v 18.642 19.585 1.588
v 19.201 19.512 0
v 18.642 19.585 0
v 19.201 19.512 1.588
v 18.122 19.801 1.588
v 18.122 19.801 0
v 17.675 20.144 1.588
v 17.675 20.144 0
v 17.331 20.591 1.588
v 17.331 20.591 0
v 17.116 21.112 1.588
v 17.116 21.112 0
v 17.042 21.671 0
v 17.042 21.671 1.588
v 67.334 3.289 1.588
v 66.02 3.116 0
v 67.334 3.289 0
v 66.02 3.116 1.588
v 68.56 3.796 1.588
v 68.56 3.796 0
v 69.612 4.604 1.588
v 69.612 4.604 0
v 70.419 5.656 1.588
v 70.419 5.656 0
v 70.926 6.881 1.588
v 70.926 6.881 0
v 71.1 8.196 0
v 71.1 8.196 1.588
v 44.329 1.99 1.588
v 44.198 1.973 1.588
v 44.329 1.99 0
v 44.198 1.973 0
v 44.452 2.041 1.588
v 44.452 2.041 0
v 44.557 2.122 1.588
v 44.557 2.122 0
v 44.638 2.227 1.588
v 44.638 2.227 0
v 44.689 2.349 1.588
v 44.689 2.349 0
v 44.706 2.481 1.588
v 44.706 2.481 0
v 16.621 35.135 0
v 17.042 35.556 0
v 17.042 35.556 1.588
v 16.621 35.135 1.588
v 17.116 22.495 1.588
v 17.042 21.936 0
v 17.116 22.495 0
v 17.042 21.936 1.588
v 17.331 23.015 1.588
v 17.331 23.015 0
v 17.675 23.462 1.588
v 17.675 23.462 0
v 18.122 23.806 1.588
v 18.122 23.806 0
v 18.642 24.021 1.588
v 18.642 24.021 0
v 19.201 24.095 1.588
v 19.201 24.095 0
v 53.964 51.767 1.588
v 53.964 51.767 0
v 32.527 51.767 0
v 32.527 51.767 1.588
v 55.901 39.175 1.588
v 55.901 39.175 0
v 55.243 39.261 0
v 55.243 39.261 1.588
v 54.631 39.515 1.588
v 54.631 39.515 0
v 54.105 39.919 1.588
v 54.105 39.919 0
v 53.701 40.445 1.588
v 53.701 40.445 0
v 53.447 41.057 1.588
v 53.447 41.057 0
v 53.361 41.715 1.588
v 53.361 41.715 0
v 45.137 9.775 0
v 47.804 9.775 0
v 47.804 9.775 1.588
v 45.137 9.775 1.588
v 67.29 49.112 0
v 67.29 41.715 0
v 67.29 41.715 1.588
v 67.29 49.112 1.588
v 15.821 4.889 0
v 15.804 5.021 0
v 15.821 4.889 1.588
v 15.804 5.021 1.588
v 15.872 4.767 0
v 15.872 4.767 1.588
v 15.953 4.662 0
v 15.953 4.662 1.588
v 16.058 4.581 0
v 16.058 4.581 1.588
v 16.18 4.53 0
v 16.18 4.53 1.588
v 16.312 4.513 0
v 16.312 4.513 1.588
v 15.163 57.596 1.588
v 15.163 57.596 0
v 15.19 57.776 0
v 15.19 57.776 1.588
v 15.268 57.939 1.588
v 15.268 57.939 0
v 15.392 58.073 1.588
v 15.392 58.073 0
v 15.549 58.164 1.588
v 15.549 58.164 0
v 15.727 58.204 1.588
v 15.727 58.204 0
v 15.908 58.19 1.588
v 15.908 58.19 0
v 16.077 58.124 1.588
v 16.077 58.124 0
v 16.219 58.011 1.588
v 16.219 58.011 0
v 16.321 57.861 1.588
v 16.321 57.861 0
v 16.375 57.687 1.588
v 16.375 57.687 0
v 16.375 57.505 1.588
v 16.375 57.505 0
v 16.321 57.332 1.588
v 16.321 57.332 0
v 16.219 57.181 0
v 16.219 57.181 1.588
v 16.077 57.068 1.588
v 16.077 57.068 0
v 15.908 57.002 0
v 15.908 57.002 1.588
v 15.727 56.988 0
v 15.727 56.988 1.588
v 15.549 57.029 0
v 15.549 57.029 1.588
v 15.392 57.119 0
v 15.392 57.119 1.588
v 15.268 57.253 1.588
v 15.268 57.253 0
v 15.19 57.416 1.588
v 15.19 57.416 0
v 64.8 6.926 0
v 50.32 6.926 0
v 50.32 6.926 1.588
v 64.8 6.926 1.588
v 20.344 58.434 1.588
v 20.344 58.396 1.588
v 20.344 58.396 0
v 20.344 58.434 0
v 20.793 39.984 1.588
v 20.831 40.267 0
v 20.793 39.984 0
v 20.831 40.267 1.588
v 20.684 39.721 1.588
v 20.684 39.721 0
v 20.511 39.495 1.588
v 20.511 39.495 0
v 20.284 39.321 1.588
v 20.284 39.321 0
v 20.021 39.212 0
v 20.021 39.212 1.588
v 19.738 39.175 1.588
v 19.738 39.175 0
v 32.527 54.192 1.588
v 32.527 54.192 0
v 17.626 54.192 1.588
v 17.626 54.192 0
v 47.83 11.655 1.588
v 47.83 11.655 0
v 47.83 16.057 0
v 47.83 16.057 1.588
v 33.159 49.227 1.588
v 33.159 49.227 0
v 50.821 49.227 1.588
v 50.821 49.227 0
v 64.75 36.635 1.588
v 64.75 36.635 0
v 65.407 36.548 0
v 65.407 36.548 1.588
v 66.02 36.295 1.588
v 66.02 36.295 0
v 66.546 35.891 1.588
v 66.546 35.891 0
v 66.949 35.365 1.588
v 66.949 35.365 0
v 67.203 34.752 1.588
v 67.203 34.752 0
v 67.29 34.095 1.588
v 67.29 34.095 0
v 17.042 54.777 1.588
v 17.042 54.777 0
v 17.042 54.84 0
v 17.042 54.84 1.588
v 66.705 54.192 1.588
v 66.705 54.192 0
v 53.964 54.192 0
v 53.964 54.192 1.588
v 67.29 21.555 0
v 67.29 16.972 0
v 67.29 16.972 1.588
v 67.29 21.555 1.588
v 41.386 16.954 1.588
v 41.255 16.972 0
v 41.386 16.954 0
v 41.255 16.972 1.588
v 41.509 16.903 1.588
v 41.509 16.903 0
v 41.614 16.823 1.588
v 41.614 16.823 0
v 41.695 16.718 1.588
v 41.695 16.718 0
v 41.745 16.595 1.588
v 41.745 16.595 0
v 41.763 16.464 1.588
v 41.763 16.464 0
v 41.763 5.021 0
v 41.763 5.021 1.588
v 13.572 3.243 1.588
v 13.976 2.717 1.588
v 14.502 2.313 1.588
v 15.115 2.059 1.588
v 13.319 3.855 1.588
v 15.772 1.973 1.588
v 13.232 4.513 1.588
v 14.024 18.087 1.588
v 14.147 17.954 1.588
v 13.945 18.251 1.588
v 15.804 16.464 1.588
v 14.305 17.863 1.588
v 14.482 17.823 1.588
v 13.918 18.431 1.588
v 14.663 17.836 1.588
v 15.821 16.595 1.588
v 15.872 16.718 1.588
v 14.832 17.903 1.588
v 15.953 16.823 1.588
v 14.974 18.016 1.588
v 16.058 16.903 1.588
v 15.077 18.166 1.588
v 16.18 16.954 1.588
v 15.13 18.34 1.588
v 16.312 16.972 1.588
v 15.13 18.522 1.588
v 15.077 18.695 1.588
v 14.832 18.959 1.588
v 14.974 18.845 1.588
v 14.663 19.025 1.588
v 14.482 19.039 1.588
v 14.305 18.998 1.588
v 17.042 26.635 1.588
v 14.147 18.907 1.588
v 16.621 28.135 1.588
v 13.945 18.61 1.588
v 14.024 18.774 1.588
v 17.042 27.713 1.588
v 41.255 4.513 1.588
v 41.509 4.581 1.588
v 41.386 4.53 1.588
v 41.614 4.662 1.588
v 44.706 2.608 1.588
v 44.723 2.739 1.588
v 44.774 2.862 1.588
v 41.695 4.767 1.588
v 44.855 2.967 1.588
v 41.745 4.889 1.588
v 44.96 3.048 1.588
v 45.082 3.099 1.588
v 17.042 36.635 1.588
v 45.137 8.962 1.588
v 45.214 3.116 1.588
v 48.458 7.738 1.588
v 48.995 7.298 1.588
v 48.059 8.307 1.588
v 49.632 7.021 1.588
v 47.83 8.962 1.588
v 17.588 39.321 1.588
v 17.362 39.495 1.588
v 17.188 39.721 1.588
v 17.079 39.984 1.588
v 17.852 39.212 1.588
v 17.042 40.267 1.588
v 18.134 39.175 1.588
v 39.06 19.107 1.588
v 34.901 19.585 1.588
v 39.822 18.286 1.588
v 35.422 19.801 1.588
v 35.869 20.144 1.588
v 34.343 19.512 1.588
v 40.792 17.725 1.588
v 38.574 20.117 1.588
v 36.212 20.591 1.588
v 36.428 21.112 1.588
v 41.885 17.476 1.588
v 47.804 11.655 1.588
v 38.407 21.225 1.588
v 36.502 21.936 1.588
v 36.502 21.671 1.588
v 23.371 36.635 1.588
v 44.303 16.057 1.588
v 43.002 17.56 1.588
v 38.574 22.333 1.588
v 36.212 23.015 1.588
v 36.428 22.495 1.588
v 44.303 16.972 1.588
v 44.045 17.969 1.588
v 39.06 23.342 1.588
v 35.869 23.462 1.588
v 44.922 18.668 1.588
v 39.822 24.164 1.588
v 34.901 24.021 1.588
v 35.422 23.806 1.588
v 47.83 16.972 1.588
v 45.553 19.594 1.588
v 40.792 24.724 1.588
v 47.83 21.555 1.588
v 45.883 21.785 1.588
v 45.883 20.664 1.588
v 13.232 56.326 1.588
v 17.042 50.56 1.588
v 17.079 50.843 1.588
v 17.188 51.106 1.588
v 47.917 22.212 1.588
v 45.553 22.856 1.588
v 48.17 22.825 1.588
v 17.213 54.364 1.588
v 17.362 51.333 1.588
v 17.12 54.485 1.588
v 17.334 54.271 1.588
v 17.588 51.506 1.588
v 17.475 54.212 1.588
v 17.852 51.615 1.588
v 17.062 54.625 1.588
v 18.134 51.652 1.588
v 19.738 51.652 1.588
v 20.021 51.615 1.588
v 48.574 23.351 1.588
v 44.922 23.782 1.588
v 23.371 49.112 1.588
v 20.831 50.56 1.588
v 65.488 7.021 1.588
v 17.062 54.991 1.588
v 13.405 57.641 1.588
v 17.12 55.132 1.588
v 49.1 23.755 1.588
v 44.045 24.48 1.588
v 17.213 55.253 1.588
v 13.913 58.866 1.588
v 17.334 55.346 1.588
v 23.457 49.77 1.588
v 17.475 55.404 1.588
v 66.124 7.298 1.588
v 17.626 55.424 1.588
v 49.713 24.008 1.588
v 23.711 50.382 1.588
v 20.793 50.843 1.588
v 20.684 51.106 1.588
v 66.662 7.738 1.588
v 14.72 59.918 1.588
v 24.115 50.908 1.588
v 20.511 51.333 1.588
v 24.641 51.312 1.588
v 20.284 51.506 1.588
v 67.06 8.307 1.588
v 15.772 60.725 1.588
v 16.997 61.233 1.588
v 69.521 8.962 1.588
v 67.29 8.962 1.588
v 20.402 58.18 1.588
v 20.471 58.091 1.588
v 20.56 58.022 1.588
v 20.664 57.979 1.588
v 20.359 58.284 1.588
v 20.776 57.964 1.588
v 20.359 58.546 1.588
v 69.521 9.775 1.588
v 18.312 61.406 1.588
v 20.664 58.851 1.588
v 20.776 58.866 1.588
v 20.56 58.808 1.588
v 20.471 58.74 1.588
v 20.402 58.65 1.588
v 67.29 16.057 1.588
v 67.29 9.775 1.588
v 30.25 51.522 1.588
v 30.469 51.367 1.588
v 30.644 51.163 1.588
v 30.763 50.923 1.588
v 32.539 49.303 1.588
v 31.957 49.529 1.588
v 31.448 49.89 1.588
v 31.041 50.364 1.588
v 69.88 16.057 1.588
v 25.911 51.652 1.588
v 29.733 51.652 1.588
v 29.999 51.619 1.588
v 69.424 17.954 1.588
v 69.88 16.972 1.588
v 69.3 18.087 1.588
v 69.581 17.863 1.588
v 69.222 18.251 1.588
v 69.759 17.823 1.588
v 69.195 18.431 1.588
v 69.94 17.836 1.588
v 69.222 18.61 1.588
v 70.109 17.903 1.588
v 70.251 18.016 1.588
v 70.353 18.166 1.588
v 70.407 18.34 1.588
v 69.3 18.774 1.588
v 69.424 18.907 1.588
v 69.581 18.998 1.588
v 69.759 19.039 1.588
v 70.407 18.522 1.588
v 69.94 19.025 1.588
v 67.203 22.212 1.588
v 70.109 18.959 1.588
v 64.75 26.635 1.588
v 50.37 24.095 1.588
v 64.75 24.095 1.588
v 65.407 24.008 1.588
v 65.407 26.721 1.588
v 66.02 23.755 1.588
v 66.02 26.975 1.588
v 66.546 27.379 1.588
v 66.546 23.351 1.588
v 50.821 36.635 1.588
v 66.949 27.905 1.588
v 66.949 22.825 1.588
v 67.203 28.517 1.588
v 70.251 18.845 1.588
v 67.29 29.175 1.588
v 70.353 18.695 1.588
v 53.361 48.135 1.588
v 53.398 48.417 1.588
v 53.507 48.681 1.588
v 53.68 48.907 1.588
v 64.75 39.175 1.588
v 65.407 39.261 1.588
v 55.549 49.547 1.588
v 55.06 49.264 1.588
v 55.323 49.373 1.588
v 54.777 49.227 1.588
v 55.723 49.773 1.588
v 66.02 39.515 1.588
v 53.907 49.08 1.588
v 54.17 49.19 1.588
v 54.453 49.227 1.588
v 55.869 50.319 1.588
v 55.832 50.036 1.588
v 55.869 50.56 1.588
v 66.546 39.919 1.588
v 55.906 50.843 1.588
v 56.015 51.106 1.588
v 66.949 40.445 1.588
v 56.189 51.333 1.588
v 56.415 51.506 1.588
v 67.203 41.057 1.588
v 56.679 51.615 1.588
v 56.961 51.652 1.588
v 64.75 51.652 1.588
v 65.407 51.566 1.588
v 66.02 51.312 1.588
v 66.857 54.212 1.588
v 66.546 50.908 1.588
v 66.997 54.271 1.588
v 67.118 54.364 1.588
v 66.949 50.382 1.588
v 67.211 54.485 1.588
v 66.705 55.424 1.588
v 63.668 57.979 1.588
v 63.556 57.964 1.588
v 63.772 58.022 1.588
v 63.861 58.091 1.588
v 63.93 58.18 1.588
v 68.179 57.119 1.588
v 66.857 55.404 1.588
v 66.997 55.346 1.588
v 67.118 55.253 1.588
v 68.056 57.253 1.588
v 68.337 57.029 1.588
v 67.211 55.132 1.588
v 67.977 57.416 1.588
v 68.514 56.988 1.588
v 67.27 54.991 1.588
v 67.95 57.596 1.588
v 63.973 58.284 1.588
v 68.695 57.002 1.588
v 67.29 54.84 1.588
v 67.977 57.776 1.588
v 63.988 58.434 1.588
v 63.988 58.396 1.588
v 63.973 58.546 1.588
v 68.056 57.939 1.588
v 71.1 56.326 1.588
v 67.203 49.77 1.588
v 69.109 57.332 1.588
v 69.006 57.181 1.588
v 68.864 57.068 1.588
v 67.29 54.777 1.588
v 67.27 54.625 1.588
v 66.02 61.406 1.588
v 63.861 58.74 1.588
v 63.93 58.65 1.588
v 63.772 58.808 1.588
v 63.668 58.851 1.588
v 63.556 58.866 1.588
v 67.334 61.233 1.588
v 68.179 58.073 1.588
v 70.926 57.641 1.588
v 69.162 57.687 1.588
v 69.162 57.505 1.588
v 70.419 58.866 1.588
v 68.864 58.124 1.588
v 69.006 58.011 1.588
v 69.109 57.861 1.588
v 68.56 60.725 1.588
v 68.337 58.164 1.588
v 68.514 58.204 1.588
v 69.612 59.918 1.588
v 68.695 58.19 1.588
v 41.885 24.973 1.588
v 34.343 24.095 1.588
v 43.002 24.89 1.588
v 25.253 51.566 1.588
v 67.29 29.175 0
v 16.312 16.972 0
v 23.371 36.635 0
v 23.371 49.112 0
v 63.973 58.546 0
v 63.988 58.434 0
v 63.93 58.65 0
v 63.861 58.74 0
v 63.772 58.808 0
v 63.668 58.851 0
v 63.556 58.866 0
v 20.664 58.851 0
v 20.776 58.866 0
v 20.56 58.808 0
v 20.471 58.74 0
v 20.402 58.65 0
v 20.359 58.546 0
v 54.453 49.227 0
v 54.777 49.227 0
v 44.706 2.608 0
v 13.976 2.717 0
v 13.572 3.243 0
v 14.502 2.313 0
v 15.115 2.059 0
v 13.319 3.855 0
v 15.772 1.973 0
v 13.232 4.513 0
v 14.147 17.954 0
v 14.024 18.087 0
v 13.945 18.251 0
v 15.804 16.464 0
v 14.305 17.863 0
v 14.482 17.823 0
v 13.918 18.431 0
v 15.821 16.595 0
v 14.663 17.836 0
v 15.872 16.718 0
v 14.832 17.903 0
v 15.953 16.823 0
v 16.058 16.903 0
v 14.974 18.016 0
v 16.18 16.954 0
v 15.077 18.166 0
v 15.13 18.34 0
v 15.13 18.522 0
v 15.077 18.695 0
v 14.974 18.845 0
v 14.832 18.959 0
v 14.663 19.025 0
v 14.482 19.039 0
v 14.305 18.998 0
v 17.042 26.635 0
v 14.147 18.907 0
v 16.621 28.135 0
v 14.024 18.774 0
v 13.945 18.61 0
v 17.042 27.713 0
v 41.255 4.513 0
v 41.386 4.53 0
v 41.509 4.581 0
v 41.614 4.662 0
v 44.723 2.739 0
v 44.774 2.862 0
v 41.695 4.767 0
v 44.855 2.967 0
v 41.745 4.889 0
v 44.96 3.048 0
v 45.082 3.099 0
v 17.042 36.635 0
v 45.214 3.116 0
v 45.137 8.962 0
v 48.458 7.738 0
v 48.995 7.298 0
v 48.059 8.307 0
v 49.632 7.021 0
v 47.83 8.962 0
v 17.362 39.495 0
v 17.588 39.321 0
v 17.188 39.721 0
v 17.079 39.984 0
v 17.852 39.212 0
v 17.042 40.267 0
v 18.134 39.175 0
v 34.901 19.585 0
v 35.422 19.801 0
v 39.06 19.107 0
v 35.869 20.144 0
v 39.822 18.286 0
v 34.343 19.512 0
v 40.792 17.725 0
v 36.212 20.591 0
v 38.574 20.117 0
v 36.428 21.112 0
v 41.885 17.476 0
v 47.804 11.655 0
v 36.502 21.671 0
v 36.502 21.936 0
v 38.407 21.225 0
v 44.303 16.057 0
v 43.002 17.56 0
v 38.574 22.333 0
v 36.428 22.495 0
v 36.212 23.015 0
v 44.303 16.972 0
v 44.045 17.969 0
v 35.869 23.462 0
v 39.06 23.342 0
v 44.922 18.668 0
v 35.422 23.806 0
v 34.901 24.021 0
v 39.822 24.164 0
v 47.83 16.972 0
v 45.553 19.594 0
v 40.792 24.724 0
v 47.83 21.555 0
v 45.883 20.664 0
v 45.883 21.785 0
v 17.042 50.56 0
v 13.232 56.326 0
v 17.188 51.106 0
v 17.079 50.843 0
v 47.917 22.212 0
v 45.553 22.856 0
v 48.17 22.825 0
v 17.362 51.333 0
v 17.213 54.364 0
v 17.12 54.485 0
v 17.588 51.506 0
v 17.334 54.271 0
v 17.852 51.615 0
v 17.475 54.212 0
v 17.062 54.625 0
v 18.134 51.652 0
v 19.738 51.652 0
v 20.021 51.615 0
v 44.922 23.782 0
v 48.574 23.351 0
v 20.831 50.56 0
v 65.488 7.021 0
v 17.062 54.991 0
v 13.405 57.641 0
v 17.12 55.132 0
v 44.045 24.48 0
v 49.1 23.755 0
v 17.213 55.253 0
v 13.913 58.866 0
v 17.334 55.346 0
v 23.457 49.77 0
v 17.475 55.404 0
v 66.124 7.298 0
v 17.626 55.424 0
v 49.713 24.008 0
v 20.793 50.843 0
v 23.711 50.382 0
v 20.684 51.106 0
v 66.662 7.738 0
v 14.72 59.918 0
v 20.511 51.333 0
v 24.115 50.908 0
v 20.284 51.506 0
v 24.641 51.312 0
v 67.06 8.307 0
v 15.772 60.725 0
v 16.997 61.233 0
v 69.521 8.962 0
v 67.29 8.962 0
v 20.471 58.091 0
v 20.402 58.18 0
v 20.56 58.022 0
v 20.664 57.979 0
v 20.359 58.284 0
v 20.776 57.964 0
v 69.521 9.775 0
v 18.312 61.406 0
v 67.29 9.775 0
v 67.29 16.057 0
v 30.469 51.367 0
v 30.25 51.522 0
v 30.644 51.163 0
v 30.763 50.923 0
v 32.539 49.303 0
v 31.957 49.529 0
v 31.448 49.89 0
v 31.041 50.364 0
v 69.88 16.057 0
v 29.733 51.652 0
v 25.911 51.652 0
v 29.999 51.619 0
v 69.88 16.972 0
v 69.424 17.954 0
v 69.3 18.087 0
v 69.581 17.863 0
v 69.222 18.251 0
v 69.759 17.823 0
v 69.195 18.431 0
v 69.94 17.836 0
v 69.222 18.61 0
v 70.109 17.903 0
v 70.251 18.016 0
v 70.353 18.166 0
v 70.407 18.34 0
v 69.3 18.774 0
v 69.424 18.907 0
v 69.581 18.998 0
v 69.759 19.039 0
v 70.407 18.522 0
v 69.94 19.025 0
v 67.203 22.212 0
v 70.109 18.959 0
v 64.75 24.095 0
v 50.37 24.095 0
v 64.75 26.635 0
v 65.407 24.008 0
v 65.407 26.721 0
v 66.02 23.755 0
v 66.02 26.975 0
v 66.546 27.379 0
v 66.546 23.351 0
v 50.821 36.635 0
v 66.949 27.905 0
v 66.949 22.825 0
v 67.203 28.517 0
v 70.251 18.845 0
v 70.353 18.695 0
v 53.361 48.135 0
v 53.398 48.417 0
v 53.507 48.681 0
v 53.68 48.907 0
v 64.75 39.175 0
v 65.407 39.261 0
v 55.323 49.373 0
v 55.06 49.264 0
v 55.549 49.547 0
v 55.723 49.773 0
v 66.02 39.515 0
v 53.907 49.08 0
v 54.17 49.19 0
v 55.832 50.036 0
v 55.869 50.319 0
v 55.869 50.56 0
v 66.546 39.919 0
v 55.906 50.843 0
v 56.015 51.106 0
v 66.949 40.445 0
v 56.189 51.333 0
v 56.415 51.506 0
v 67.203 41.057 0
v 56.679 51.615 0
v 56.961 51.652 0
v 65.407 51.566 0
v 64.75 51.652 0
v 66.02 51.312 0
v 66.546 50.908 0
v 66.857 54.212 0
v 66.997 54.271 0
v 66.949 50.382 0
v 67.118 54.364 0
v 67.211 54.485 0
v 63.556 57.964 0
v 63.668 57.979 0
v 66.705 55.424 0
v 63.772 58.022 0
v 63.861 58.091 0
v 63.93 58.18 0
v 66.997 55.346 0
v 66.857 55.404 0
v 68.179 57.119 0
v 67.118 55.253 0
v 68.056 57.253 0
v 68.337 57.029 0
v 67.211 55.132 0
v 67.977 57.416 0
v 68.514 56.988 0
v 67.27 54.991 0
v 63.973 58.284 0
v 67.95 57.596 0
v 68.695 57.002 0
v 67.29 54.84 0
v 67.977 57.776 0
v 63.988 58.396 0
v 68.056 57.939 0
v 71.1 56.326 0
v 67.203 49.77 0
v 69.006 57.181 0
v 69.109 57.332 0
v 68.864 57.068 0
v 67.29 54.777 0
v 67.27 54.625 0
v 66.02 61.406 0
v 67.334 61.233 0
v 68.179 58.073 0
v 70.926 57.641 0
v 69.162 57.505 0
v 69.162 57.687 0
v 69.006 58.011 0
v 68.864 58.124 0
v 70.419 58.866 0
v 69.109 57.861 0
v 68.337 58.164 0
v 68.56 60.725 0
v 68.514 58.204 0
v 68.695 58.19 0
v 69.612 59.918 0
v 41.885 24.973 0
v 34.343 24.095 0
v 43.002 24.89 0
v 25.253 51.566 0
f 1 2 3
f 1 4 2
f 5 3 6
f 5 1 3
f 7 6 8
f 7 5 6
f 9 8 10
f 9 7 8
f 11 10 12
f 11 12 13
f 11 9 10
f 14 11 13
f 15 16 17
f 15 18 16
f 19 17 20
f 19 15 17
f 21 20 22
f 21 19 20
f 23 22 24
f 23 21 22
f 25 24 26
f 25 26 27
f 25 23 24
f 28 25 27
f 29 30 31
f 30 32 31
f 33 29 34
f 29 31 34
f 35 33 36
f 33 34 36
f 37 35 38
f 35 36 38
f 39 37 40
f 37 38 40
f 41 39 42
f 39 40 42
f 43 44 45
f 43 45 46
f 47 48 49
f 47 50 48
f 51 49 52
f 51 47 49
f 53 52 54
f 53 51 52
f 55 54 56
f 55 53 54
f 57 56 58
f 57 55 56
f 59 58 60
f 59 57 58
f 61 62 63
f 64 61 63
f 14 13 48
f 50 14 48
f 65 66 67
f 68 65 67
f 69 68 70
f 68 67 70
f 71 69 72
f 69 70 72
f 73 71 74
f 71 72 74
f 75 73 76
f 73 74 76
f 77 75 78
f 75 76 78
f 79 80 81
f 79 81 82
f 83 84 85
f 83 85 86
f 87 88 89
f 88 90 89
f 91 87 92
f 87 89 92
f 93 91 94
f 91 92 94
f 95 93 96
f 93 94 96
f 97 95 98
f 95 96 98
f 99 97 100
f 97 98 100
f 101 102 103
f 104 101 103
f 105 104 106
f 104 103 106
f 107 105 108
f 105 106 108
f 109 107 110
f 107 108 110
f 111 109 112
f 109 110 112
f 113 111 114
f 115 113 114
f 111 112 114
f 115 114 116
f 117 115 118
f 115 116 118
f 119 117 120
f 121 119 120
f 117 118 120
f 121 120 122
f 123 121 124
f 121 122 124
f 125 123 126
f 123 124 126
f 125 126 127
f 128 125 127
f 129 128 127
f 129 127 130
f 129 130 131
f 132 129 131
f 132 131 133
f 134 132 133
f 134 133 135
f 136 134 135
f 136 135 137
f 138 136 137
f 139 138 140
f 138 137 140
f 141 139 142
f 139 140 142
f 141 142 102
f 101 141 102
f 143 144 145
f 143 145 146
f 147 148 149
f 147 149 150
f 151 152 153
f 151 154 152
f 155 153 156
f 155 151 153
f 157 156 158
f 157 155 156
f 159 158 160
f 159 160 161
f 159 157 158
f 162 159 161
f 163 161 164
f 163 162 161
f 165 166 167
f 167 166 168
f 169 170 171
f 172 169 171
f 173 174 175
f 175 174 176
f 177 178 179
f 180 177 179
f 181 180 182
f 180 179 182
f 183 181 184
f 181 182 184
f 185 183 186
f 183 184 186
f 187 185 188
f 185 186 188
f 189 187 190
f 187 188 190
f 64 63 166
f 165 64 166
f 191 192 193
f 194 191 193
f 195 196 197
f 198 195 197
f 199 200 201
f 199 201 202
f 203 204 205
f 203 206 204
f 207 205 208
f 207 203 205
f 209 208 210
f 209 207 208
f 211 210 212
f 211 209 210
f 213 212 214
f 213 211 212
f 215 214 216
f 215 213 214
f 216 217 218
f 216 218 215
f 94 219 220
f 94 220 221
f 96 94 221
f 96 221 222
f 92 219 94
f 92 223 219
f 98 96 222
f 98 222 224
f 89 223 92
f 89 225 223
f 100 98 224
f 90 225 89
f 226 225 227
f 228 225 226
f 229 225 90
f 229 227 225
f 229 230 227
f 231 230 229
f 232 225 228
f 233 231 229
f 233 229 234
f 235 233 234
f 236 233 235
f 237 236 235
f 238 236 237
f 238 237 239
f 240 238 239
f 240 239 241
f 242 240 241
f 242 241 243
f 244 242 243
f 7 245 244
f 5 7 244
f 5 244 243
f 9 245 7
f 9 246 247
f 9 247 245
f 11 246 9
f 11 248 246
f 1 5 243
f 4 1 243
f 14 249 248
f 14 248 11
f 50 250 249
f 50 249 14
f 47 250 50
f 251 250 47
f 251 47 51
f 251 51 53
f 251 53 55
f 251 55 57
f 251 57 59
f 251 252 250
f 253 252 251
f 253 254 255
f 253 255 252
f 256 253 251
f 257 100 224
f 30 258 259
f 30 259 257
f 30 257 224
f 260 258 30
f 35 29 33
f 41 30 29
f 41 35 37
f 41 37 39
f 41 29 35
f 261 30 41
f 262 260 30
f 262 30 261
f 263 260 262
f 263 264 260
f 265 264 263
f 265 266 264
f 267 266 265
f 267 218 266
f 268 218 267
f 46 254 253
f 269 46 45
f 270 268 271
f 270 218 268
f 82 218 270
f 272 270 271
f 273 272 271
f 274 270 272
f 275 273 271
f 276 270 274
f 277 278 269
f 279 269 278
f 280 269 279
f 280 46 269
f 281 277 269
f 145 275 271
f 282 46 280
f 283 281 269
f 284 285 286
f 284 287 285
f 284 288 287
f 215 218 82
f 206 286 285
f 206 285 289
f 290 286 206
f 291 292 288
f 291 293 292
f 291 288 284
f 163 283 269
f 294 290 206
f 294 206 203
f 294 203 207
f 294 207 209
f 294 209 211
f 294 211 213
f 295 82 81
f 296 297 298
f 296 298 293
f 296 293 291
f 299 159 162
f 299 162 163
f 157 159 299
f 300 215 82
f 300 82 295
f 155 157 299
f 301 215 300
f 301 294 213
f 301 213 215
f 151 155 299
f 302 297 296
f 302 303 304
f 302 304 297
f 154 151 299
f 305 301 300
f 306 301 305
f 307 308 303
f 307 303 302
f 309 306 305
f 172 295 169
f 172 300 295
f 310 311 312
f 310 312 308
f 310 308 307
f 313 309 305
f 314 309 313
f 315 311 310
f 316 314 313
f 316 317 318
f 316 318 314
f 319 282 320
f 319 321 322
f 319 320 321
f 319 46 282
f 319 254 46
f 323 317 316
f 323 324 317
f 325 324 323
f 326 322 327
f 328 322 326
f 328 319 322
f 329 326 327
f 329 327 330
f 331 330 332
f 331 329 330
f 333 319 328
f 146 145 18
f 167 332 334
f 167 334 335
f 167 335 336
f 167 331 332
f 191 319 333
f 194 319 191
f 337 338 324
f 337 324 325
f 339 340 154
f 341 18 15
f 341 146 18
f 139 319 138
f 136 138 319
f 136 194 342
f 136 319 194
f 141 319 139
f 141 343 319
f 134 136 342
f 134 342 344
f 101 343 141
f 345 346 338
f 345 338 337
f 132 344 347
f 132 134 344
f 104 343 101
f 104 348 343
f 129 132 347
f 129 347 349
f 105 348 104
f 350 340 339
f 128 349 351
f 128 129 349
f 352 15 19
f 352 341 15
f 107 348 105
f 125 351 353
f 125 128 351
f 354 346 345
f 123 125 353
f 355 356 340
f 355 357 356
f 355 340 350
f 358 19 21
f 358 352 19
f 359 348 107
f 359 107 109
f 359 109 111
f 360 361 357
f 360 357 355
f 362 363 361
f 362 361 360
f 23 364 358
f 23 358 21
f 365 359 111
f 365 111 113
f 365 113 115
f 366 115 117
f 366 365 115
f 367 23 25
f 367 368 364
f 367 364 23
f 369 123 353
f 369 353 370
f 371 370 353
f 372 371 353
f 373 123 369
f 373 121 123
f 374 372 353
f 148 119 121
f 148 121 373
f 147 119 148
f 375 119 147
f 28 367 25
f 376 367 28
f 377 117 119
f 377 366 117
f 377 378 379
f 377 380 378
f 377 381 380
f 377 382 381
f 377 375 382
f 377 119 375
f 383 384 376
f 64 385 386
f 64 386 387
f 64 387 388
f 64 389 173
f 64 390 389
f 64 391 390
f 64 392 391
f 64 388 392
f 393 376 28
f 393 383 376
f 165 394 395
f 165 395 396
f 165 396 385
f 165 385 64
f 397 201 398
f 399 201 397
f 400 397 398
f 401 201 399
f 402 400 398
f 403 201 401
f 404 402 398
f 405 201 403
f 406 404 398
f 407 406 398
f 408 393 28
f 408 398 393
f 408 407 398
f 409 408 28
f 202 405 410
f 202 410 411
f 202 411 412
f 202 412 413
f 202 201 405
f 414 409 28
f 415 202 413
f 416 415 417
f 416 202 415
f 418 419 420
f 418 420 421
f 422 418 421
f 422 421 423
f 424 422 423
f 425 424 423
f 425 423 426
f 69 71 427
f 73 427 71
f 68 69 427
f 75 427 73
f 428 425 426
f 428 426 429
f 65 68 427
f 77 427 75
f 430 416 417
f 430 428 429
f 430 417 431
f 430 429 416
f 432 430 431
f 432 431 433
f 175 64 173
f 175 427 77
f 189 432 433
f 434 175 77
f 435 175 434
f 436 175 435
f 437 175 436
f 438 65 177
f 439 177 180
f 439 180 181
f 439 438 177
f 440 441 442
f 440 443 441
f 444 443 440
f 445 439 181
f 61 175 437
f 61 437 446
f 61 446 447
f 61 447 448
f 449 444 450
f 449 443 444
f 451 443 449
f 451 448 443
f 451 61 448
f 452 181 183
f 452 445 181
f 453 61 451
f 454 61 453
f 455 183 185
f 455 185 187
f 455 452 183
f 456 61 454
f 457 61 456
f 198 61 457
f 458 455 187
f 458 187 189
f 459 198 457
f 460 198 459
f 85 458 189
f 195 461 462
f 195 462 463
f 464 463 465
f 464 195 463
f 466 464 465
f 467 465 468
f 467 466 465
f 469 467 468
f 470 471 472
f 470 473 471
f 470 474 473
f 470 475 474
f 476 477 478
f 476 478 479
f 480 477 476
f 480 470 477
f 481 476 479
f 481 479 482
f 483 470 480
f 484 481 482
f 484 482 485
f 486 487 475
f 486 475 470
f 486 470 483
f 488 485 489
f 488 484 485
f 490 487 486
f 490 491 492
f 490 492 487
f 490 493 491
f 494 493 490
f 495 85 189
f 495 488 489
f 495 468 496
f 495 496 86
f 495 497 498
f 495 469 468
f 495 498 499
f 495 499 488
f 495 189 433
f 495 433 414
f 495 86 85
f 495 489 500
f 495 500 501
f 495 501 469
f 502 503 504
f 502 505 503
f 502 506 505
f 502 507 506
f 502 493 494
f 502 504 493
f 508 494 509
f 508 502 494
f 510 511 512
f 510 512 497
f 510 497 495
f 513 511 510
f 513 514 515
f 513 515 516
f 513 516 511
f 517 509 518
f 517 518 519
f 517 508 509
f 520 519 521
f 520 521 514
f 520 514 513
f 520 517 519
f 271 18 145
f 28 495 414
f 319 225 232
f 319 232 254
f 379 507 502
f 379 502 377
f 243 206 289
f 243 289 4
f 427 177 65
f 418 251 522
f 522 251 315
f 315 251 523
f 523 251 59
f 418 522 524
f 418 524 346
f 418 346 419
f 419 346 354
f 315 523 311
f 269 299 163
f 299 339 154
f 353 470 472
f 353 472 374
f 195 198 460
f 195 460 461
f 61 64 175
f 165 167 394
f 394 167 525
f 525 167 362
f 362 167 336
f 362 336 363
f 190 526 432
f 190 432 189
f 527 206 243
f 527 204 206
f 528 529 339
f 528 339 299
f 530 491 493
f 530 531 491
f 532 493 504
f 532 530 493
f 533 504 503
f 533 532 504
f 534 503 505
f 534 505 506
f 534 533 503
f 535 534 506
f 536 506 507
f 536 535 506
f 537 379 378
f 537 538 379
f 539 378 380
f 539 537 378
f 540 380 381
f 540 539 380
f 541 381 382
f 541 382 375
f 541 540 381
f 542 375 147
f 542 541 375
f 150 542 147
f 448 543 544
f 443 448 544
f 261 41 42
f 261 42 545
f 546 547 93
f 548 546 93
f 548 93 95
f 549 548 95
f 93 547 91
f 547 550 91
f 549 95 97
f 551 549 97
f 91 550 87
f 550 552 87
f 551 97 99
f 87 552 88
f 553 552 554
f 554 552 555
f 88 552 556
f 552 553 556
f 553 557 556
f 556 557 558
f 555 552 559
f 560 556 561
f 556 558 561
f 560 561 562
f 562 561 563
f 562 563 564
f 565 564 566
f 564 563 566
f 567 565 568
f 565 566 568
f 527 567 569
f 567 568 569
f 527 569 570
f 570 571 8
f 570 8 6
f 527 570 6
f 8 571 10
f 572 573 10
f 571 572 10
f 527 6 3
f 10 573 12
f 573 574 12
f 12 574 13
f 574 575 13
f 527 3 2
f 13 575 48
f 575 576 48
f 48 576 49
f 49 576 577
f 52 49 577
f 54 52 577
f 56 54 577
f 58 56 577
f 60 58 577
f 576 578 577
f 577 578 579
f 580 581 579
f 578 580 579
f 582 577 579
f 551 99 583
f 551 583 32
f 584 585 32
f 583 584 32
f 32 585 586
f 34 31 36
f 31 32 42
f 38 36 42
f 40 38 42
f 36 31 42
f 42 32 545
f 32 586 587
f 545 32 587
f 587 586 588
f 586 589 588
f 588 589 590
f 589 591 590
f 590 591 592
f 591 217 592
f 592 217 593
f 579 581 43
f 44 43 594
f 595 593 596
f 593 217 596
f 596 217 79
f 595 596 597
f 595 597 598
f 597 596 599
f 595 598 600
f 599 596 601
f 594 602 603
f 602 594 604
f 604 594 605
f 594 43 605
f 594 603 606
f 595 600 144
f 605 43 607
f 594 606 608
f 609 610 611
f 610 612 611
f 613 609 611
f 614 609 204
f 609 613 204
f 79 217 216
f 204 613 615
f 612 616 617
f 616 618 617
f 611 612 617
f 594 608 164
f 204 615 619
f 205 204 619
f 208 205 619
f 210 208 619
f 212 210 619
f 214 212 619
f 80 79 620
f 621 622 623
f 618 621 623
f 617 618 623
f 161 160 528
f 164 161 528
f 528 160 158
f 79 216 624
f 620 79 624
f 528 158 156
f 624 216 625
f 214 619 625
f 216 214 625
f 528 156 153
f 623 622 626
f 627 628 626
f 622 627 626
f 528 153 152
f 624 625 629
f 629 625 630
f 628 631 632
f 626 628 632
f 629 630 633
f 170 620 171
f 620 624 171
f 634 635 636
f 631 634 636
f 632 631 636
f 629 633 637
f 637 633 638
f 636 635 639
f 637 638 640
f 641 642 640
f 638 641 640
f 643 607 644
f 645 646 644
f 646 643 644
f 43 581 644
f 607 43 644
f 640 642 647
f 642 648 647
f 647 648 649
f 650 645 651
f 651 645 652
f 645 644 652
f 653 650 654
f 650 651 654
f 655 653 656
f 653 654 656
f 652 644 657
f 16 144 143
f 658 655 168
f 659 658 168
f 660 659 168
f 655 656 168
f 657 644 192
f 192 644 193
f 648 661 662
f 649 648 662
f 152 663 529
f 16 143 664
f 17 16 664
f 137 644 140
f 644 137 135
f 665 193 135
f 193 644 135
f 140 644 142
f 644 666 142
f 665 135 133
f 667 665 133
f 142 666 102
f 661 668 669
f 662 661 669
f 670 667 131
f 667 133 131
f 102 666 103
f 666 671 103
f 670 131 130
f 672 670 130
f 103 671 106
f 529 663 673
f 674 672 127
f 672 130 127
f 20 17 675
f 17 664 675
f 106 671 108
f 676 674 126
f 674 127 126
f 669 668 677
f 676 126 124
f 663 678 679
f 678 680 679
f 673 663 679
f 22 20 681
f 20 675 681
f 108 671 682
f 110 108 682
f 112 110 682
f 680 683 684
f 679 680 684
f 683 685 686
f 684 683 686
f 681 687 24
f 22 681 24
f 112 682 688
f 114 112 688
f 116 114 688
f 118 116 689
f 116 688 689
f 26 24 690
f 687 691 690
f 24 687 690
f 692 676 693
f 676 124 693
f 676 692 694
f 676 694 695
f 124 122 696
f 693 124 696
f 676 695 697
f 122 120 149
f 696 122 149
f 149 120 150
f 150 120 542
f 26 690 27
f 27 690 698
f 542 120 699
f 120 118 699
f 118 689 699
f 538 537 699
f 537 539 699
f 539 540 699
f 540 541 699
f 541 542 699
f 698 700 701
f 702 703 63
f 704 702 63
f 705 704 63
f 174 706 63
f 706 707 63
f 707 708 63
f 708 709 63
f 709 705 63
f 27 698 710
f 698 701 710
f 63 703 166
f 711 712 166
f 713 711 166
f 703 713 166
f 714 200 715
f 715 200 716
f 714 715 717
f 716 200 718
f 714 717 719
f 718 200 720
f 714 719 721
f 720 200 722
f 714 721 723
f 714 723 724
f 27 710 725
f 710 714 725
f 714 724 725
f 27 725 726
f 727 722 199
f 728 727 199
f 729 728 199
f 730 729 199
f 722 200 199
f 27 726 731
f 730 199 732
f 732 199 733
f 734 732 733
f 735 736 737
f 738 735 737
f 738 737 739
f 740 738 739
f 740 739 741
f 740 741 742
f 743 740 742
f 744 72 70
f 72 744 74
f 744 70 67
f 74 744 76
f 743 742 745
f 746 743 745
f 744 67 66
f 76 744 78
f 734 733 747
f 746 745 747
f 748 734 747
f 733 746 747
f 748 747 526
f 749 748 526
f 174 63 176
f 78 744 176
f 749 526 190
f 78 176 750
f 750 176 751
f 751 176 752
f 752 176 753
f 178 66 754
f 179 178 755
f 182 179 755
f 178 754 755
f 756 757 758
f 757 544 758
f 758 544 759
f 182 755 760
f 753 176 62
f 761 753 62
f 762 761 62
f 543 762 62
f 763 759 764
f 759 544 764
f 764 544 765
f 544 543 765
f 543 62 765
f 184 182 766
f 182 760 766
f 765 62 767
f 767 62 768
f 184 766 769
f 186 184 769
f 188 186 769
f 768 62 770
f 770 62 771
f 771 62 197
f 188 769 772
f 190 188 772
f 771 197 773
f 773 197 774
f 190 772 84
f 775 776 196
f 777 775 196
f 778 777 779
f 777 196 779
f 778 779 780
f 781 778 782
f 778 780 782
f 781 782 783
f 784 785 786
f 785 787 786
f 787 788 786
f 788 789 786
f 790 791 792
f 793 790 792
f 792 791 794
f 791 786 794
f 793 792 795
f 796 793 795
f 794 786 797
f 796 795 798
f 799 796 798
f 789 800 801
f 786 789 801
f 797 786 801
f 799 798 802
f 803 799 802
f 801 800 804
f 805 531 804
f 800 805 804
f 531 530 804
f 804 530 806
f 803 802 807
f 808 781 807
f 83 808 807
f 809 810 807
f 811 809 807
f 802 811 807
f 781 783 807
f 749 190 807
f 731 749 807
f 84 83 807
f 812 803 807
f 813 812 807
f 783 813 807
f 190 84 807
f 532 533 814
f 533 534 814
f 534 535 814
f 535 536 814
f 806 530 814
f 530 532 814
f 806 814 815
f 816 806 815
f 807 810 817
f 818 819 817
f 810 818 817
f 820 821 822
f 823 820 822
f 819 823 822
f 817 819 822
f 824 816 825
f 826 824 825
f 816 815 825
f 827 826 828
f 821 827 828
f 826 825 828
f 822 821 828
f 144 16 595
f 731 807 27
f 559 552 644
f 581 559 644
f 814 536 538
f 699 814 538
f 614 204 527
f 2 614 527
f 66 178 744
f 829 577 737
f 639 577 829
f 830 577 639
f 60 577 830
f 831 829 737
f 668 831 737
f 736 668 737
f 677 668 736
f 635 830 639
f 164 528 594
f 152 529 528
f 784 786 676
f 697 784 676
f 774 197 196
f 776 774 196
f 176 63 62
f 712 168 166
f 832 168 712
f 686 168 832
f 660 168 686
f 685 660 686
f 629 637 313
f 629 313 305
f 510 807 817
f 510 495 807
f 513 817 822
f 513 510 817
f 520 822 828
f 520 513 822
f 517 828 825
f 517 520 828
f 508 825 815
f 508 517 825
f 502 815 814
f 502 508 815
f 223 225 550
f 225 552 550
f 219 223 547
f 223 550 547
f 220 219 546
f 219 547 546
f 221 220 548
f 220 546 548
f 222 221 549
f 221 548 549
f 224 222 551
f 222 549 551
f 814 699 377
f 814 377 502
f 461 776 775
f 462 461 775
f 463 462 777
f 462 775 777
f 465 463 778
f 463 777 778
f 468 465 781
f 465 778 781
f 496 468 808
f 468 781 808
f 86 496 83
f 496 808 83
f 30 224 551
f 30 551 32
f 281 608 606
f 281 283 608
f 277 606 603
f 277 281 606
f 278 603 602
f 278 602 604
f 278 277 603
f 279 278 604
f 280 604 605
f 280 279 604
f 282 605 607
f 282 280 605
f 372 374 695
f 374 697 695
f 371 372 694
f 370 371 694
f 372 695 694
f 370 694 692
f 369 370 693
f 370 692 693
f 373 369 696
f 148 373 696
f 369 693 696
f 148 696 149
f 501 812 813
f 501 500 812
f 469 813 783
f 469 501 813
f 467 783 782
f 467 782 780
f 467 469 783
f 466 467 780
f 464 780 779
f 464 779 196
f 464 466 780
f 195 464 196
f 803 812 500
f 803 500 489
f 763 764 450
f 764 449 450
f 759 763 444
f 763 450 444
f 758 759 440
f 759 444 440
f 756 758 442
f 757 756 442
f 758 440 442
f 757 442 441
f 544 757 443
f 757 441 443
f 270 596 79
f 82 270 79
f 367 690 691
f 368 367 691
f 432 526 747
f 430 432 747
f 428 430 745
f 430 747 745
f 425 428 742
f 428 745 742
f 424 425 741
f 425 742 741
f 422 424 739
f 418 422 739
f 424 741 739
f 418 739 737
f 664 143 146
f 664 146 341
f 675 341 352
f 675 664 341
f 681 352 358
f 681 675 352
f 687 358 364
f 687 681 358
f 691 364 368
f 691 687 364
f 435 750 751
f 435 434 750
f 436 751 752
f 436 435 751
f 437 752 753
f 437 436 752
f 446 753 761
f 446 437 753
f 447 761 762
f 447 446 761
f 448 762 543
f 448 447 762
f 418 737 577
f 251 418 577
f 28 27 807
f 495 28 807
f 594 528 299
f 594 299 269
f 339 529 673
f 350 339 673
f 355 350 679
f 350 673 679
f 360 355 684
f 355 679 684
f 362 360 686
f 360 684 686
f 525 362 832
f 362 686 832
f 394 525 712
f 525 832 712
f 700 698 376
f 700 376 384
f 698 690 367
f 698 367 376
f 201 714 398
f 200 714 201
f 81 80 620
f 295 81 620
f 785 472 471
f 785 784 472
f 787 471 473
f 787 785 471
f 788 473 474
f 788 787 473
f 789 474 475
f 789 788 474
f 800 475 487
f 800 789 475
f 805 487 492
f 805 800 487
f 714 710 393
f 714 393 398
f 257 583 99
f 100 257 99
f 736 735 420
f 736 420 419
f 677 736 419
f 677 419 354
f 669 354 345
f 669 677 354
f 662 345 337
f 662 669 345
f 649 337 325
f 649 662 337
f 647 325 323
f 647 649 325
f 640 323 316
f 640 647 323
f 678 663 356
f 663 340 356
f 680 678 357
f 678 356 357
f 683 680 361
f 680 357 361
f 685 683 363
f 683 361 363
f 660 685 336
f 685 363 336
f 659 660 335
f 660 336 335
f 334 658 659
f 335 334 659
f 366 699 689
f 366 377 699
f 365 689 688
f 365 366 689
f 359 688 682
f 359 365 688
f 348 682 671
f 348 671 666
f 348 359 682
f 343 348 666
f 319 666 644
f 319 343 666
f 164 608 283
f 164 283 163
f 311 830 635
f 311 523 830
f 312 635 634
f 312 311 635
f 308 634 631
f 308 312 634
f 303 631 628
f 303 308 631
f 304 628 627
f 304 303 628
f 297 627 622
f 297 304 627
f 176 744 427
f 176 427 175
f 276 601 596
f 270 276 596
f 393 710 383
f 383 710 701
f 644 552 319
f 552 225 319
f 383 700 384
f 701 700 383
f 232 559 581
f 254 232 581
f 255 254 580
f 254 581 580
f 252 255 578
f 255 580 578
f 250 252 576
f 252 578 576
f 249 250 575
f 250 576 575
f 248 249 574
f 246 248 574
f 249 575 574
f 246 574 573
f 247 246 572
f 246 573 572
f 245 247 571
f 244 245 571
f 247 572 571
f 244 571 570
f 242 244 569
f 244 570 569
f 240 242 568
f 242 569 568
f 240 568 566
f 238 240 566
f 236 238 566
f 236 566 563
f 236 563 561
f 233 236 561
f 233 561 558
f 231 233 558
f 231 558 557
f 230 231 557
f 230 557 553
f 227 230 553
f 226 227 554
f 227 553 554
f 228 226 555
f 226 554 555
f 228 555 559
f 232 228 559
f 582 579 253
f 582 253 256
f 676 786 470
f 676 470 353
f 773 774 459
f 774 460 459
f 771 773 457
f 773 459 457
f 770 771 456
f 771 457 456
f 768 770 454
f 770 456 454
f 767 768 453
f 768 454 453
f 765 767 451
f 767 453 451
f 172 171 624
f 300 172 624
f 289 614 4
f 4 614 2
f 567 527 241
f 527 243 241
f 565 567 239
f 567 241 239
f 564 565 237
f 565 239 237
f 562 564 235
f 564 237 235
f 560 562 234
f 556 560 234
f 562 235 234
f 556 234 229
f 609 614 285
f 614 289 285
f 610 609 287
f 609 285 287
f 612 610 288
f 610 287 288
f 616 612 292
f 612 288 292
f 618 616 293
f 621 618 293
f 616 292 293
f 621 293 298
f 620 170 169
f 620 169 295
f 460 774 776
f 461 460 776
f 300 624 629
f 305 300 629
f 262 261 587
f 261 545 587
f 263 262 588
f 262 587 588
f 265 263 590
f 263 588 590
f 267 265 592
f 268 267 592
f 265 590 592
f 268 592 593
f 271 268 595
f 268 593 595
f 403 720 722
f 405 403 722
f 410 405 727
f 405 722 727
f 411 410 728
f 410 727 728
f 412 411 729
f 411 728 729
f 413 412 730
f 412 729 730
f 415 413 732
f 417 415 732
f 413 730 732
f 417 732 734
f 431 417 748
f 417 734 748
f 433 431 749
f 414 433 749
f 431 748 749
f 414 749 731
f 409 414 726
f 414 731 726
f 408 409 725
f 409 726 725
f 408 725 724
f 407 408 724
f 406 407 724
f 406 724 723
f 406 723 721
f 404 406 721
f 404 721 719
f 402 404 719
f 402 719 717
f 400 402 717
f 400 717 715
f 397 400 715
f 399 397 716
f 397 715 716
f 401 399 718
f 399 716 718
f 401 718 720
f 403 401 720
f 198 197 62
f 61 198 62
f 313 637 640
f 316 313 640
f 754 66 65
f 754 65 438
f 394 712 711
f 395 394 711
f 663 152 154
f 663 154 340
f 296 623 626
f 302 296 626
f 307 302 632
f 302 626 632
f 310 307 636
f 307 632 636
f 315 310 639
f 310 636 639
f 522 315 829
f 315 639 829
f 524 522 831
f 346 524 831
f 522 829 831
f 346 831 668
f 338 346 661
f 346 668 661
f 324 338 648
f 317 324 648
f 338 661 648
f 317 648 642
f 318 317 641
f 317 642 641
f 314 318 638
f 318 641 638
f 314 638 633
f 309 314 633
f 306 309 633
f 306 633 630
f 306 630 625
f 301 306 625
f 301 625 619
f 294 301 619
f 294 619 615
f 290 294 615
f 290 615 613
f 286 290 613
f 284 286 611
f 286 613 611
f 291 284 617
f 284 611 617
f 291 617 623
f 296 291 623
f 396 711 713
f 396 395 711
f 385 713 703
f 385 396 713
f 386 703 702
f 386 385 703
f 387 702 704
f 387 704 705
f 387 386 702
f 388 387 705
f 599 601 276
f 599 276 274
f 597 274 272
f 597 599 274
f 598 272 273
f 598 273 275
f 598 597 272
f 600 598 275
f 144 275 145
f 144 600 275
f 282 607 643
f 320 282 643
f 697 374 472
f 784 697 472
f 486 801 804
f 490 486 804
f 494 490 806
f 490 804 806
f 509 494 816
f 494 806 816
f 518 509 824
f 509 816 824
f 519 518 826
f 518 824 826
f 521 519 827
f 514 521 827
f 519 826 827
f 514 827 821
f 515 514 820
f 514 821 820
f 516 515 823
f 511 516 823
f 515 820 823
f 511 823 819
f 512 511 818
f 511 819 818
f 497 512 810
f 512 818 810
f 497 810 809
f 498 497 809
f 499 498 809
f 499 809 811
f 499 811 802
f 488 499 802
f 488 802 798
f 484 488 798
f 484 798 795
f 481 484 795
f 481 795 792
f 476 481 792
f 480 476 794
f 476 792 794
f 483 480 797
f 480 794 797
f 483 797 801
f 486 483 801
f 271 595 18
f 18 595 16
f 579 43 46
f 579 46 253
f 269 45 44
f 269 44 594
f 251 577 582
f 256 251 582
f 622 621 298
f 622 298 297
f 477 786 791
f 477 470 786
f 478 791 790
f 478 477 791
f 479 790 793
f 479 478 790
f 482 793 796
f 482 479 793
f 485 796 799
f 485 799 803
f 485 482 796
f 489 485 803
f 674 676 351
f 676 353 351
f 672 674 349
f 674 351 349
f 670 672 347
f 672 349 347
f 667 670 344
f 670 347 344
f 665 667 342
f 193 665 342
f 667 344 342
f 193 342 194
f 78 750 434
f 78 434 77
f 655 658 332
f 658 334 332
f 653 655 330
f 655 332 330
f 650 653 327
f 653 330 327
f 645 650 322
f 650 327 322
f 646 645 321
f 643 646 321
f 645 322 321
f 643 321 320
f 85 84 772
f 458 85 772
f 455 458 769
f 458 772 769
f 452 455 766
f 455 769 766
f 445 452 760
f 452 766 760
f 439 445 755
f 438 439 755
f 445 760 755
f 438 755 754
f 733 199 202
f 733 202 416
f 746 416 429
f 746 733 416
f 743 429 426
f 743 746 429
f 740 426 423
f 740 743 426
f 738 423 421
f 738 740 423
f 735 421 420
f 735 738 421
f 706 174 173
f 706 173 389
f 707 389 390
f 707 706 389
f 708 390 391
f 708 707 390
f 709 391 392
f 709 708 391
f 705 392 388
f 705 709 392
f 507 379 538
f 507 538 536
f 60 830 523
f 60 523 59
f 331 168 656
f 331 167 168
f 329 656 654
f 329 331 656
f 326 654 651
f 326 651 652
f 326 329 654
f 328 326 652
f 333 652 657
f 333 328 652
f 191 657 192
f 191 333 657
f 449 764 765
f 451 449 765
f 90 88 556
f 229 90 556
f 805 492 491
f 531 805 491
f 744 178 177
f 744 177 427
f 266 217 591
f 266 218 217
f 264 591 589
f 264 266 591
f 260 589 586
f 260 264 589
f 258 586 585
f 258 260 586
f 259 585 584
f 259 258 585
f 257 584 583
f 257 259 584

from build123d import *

# Parameters (mm, degrees)
SKETCH1_W           = 57.8674
SKETCH1_H           = 58.2902
SKETCH1_W_2         = 50.2474
SKETCH1_H_2         = 50.6702
BOSS_EXTRUDE1_DEPTH = 1.5875
SKETCH2_W           = 50.2474
SKETCH2_H           = 2.54
SKETCH2_H_2         = 2.1717
BOSS_EXTRUDE2_DEPTH = 1.5875
BOSS_EXTRUDE3_DEPTH = 1.5875
SKETCH4_W           = 11.3284
SKETCH4_H           = 17.169
BOSS_EXTRUDE4_DEPTH = 1.5875
SKETCH5_R           = 3.7592
SKETCH5_W           = 25.9588
SKETCH5_H           = 12.4587
CUT_EXTRUDE1_DEPTH  = 1.5875
SKETCH8_W           = 19.4595
SKETCH8_H           = 2.54
BOSS_EXTRUDE5_DEPTH = 1.5875
FILLET1_R           = 5.08
FILLET2_START       = -1
FILLET2_DEPTH       = 4
FILLET2_2_DEPTH     = 1.5875
FILLET3_R           = 1.0922
FILLET4_R           = 0.5842
FILLET8_R           = 2.159
SKETCH6_R           = 0.6096
CUT_EXTRUDE2_DEPTH  = 1.5875
SKETCH7_W           = 24.384
SKETCH7_H           = 0.8128
SKETCH7_W_2         = 19.05
SKETCH7_H_2         = 1.8796
SKETCH7_W_3         = 25.5778
SKETCH7_H_3         = 0.9144
CUT_EXTRUDE3_DEPTH  = 1.5875
FILLET6_R           = 0.508
SKETCH9_W           = 43.6434
SKETCH9_H           = 0.9017
CUT_EXTRUDE4_DEPTH  = 1.5875
FILLET7_R           = 0.4318
FILLET9_R           = 2.54
SKETCH10_W          = 31.4737
SKETCH10_H          = 1.143
BOSS_EXTRUDE6_DEPTH = 1.5875
FILLET10_R          = 2.54
FILLET11_R          = 0.508


with BuildPart() as part:
    # Sketch1 → Boss-Extrude1 (new body)
    with BuildSketch(Plane.XY):
        with Locations((42.165860751, 32.260946044)):
            Rectangle(SKETCH1_W, SKETCH1_H)
        with Locations((42.165860751, 32.260946044)):
            Rectangle(SKETCH1_W_2, SKETCH1_H_2, mode=Mode.SUBTRACT)
    extrude(amount=BOSS_EXTRUDE1_DEPTH)

    # Sketch2 → Boss-Extrude2 (add)
    with BuildSketch(Plane(origin=(0, 0, 0), x_dir=(-1, 0, 0), z_dir=(0, 0, -1))):
        with Locations((-42.165860751, 25.364846044)):
            Rectangle(SKETCH2_W, SKETCH2_H)
        Polygon((-67.289560751, 54.192446044), (-53.964160751, 54.192446044), (-53.964160751, 51.766746044), (-32.526560751, 51.766746044), (-32.526560751, 54.192446044), (-17.042160751, 54.192446044), (-17.042160751, 51.652446044), (-30.621560751, 51.652446044), (-30.621560751, 49.226746044), (-55.869160751, 49.226746044), (-55.869160751, 51.652446044), (-67.289560751, 51.652446044), align=None)
        with Locations((-42.165860751, 56.510196044)):
            Rectangle(SKETCH2_W, SKETCH2_H_2)
    extrude(amount=-BOSS_EXTRUDE2_DEPTH)

    # Sketch3 → Boss-Extrude3 (add)
    with BuildSketch(Plane(origin=(0, 0, 0), x_dir=(-1, 0, 0), z_dir=(0, 0, -1))):
        Polygon((-57.820560751, 36.634846044), (-50.820560751, 36.634846044), (-50.820560751, 28.408046044), (-50.820560751, 49.226746044), (-53.360560751, 49.226746044), (-53.360560751, 39.174846044), (-67.289560751, 39.174846044), (-67.289560751, 36.634846044), align=None)
        Polygon((-23.370560751, 36.634846044), (-20.120560751, 36.634846044), (-17.042160751, 36.634846044), (-17.042160751, 39.174846044), (-20.830560751, 39.174846044), (-20.830560751, 51.652446044), (-23.370560751, 51.652446044), align=None)
    extrude(amount=-BOSS_EXTRUDE3_DEPTH)

    # Sketch4 → Boss-Extrude4 (add)
    with BuildSketch(Plane(origin=(0, 0, 0), x_dir=(-1, 0, 0), z_dir=(0, 0, -1))):
        with Locations((-42.165860751, 15.510346044)):
            Rectangle(SKETCH4_W, SKETCH4_H)
    extrude(amount=-BOSS_EXTRUDE4_DEPTH)

    # Sketch5 → Cut-Extrude1 (cut)
    with BuildSketch(Plane(origin=(0, 0, 0), x_dir=(-1, 0, 0), z_dir=(0, 0, -1))):
        with Locations((-42.165860751, 21.224646044)):
            Circle(SKETCH5_R)
        with Locations((-28.783160751, 10.742196044)):
            Rectangle(SKETCH5_W, SKETCH5_H)
    extrude(amount=-CUT_EXTRUDE1_DEPTH, mode=Mode.SUBTRACT)

    # Sketch8 → Boss-Extrude5 (add)
    with BuildSketch(Plane(origin=(0, 0, 0), x_dir=(-1, 0, 0), z_dir=(0, 0, -1))):
        with Locations((-26.771910751, 18.241546044)):
            Rectangle(SKETCH8_W, SKETCH8_H)
    extrude(amount=-BOSS_EXTRUDE5_DEPTH)

    # Fillet1
    fillet1_edges = [part.edges().sort_by_distance(p)[0] for p in [
        (13.232160751, 61.406046044, 0.79375),
        (71.099560751, 61.406046044, 0.79375),
        (71.099560751, 3.115846044, 0.79375),
    ]]
    fillet(fillet1_edges, radius=FILLET1_R)

    # Fillet2: read off the stored shape, not the designer's step
    # Fillet2 outline → Fillet2 (cut)
    with BuildSketch(Plane.XY.offset(FILLET2_START)):
        with BuildLine():
            ThreePointArc((33.158987698, 49.226746044), (31.403812778, 49.930728342), (30.621560751, 51.652446044))
            Line((30.621560751, 51.652446044), (30.621560751, 49.226746044))
            Line((30.621560751, 49.226746044), (33.158987698, 49.226746044))
        make_face()
    extrude(amount=FILLET2_DEPTH, mode=Mode.SUBTRACT)

    # Fillet2 2 outline → Fillet2 2 (add)
    with BuildSketch(Plane.XY):
        with BuildLine():
            Line((67.289560751, 36.634846044), (64.749560751, 36.634846044))
            ThreePointArc((64.749560751, 36.634846044), (66.545611975, 35.890897268), (67.289560751, 34.094846044))
            Line((67.289560751, 34.094846044), (67.289560751, 36.634846044))
        make_face()
        with BuildLine():
            Line((67.289560751, 26.634846044), (67.289560751, 29.174846044))
            ThreePointArc((67.289560751, 29.174846044), (66.545611975, 27.37879482), (64.749560751, 26.634846044))
            Line((64.749560751, 26.634846044), (67.289560751, 26.634846044))
        make_face()
        with BuildLine():
            ThreePointArc((23.370560751, 49.112446044), (24.114509527, 50.908497268), (25.910560751, 51.652446044))
            Line((25.910560751, 51.652446044), (23.370560751, 51.652446044))
            Line((23.370560751, 51.652446044), (23.370560751, 49.112446044))
        make_face()
        with BuildLine():
            ThreePointArc((64.749560751, 51.652446044), (66.545611975, 50.908497268), (67.289560751, 49.112446044))
            Line((67.289560751, 49.112446044), (67.289560751, 51.652446044))
            Line((67.289560751, 51.652446044), (64.749560751, 51.652446044))
        make_face()
        with BuildLine():
            Line((53.360560751, 39.174846044), (55.900560751, 39.174846044))
            ThreePointArc((55.900560751, 39.174846044), (54.104509527, 39.91879482), (53.360560751, 41.714846044))
            Line((53.360560751, 41.714846044), (53.360560751, 39.174846044))
        make_face()
        with BuildLine():
            Line((67.289560751, 39.174846044), (67.289560751, 41.714846044))
            ThreePointArc((67.289560751, 41.714846044), (66.545611975, 39.91879482), (64.749560751, 39.174846044))
            Line((64.749560751, 39.174846044), (67.289560751, 39.174846044))
        make_face()
    extrude(amount=FILLET2_2_DEPTH)

    # Fillet3
    fillet3_edges = [part.edges().sort_by_distance(p)[0] for p in [
        (20.830560751, 51.652446044, 0.79375),
        (20.830560751, 39.174846044, 0.79375),
        (17.042160751, 39.174846044, 0.79375),
        (17.042160751, 51.652446044, 0.79375),
        (30.621560751, 51.652446044, 0.79375),
        (55.869160751, 49.226746044, 0.79375),
        (55.869160751, 51.652446044, 0.79375),
        (53.360560751, 49.226746044, 0.79375),
    ]]
    fillet(fillet3_edges, radius=FILLET3_R)

    # Fillet4
    fillet4_edges = [part.edges().sort_by_distance(p)[0] for p in [
        (17.042160751, 54.192446044, 0.79375),
        (67.289560751, 54.192446044, 0.79375),
        (67.289560751, 55.424346044, 0.79375),
        (17.042160751, 55.424346044, 0.79375),
    ]]
    fillet(fillet4_edges, radius=FILLET4_R)

    # Fillet8
    fillet8_edges = [part.edges().sort_by_distance(p)[0] for p in [
        (36.501660751, 24.094846044, 0.79375),
        (36.501660751, 19.511546044, 0.79375),
        (17.042160751, 19.511546044, 0.79375),
        (17.042160751, 24.094846044, 0.79375),
    ]]
    fillet(fillet8_edges, radius=FILLET8_R)

    # Sketch6 → Cut-Extrude2 (cut)
    with BuildSketch(Plane(origin=(0, 0, 0), x_dir=(-1, 0, 0), z_dir=(0, 0, -1))):
        with Locations((-68.559560751, 57.596046044)):
            Circle(SKETCH6_R)
        with Locations((-14.527560751, 18.430646044)):
            Circle(SKETCH6_R)
        with Locations((-69.804160751, 18.430646044)):
            Circle(SKETCH6_R)
        with Locations((-15.772160751, 57.596046044)):
            Circle(SKETCH6_R)
        Polygon((-16.620560751, 28.134846044), (-18.120560751, 26.634846044), (-18.120560751, 36.634846044), (-16.620560751, 35.134846044), align=None)
    extrude(amount=-CUT_EXTRUDE2_DEPTH, mode=Mode.SUBTRACT)

    # Sketch7 → Cut-Extrude3 (cut)
    with BuildSketch(Plane(origin=(0, 0, 0), x_dir=(-1, 0, 0), z_dir=(0, 0, -1))):
        with Locations((-57.328560751, 9.368745978)):
            Rectangle(SKETCH7_W, SKETCH7_H)
        with Locations((-57.328560751, 10.714945978)):
            Rectangle(SKETCH7_W_2, SKETCH7_H_2)
        with Locations((-57.091460751, 16.514346044)):
            Rectangle(SKETCH7_W_3, SKETCH7_H_3)
    extrude(amount=-CUT_EXTRUDE3_DEPTH, mode=Mode.SUBTRACT)

    # Fillet6
    fillet6_edges = [part.edges().sort_by_distance(p)[0] for p in [
        (15.803760751, 16.971546044, 0.79375),
        (15.803760751, 4.512846044, 0.79375),
        (41.762560751, 4.512846044, 0.79375),
        (41.762560751, 16.971546044, 0.79375),
    ]]
    fillet(fillet6_edges, radius=FILLET6_R)

    # Sketch9 → Cut-Extrude4 (cut)
    with BuildSketch(Plane.XY.offset(1.5875)):
        with Locations((42.165860751, 58.415196044)):
            Rectangle(SKETCH9_W, SKETCH9_H)
    extrude(amount=-CUT_EXTRUDE4_DEPTH, mode=Mode.SUBTRACT)

    # Fillet7
    fillet7_edges = [part.edges().sort_by_distance(p)[0] for p in [
        (63.987560751, 57.964346044, 0.79375),
        (63.987560751, 58.866046044, 0.79375),
        (20.344160751, 58.866046044, 0.79375),
        (20.344160751, 57.964346044, 0.79375),
    ]]
    fillet(fillet7_edges, radius=FILLET7_R)

    # Fillet9
    # the kernel refuses this fillet: 2.54 mm, written as the material it adds along each edge
    with BuildSketch(Plane(origin=(47.830060751, 6.925846044, 0), x_dir=(1, 0, 0), z_dir=(0, 0, 1))) as fillet9_piece_1:
        with BuildLine():
            CenterArc((2.489595888, 2.54), FILLET9_R, 191.433378163, 78.566621837)
            Line((0, 2.036499934), (-0.049791918, 2.026429933))
            ThreePointArc((-0.049791918, 2.026429933), (-0.0508, 1.018249967), (-0.0508, 0))
            Line((-0.0508, 0), (0, -0.0508))
            Line((0, -0.0508), (2.489595888, -0.0508))
            Line((2.489595888, -0.0508), (2.489595888, 0))
        make_face()
    extrude(amount=1.5875)
    with BuildSketch(Plane(origin=(47.830060751, 24.094846044, 0), x_dir=(1, 0, 0), z_dir=(0, 0, 1)), Plane(origin=(67.289560751, 24.094846044, 0), x_dir=(0, -1, 0), z_dir=(0, 0, 1))) as fillet9_piece_2:
        with BuildLine():
            CenterArc((FILLET9_R, -FILLET9_R), FILLET9_R, 90, 90)
            Line((0, -FILLET9_R), (-FILLET9_R * 0.02, -FILLET9_R))
            Line((-FILLET9_R * 0.02, -FILLET9_R), (-FILLET9_R * 0.02, FILLET9_R * 0.02))
            Line((-FILLET9_R * 0.02, FILLET9_R * 0.02), (FILLET9_R, FILLET9_R * 0.02))
            Line((FILLET9_R, FILLET9_R * 0.02), (FILLET9_R, 0))
        make_face()
    extrude(amount=1.5875)
    with BuildSketch(Plane(origin=(67.289560751, 6.925846044, 0), x_dir=(-1.3886374564076336e-12, 1.0, 0), z_dir=(0, 0, 1))) as fillet9_piece_3:
        with BuildLine():
            CenterArc((2.54, 2.489595888), FILLET9_R, 180, 78.566621837)
            Line((0, 2.489595888), (-0.0508, 2.489595888))
            Line((-0.0508, 2.489595888), (-0.0508, 0))
            Line((-0.0508, 0), (0, -0.0508))
            ThreePointArc((0, -0.0508), (1.018249967, -0.0508), (2.026429933, -0.049791918))
            Line((2.026429933, -0.049791918), (2.036499934, 0))
        make_face()
    extrude(amount=1.5875)

    # Sketch10 → Boss-Extrude6 (add)
    with BuildSketch(Plane.XY.offset(1.5875)):
        with Locations((28.969010751, 2.544346044)):
            Rectangle(SKETCH10_W, SKETCH10_H)
    extrude(amount=-BOSS_EXTRUDE6_DEPTH)

    # Fillet10
    fillet10_edges = [part.edges().sort_by_distance(p)[0] for p in [
        (13.232160751, 1.972846044, 0.79375),
    ]]
    fillet(fillet10_edges, radius=FILLET10_R)

    # Fillet11
    fillet11_edges = [part.edges().sort_by_distance(p)[0] for p in [
        (44.705860751, 1.972846044, 0.79375),
        (44.705860751, 3.115846044, 0.79375),
    ]]
    fillet(fillet11_edges, radius=FILLET11_R)


solid = part.part
